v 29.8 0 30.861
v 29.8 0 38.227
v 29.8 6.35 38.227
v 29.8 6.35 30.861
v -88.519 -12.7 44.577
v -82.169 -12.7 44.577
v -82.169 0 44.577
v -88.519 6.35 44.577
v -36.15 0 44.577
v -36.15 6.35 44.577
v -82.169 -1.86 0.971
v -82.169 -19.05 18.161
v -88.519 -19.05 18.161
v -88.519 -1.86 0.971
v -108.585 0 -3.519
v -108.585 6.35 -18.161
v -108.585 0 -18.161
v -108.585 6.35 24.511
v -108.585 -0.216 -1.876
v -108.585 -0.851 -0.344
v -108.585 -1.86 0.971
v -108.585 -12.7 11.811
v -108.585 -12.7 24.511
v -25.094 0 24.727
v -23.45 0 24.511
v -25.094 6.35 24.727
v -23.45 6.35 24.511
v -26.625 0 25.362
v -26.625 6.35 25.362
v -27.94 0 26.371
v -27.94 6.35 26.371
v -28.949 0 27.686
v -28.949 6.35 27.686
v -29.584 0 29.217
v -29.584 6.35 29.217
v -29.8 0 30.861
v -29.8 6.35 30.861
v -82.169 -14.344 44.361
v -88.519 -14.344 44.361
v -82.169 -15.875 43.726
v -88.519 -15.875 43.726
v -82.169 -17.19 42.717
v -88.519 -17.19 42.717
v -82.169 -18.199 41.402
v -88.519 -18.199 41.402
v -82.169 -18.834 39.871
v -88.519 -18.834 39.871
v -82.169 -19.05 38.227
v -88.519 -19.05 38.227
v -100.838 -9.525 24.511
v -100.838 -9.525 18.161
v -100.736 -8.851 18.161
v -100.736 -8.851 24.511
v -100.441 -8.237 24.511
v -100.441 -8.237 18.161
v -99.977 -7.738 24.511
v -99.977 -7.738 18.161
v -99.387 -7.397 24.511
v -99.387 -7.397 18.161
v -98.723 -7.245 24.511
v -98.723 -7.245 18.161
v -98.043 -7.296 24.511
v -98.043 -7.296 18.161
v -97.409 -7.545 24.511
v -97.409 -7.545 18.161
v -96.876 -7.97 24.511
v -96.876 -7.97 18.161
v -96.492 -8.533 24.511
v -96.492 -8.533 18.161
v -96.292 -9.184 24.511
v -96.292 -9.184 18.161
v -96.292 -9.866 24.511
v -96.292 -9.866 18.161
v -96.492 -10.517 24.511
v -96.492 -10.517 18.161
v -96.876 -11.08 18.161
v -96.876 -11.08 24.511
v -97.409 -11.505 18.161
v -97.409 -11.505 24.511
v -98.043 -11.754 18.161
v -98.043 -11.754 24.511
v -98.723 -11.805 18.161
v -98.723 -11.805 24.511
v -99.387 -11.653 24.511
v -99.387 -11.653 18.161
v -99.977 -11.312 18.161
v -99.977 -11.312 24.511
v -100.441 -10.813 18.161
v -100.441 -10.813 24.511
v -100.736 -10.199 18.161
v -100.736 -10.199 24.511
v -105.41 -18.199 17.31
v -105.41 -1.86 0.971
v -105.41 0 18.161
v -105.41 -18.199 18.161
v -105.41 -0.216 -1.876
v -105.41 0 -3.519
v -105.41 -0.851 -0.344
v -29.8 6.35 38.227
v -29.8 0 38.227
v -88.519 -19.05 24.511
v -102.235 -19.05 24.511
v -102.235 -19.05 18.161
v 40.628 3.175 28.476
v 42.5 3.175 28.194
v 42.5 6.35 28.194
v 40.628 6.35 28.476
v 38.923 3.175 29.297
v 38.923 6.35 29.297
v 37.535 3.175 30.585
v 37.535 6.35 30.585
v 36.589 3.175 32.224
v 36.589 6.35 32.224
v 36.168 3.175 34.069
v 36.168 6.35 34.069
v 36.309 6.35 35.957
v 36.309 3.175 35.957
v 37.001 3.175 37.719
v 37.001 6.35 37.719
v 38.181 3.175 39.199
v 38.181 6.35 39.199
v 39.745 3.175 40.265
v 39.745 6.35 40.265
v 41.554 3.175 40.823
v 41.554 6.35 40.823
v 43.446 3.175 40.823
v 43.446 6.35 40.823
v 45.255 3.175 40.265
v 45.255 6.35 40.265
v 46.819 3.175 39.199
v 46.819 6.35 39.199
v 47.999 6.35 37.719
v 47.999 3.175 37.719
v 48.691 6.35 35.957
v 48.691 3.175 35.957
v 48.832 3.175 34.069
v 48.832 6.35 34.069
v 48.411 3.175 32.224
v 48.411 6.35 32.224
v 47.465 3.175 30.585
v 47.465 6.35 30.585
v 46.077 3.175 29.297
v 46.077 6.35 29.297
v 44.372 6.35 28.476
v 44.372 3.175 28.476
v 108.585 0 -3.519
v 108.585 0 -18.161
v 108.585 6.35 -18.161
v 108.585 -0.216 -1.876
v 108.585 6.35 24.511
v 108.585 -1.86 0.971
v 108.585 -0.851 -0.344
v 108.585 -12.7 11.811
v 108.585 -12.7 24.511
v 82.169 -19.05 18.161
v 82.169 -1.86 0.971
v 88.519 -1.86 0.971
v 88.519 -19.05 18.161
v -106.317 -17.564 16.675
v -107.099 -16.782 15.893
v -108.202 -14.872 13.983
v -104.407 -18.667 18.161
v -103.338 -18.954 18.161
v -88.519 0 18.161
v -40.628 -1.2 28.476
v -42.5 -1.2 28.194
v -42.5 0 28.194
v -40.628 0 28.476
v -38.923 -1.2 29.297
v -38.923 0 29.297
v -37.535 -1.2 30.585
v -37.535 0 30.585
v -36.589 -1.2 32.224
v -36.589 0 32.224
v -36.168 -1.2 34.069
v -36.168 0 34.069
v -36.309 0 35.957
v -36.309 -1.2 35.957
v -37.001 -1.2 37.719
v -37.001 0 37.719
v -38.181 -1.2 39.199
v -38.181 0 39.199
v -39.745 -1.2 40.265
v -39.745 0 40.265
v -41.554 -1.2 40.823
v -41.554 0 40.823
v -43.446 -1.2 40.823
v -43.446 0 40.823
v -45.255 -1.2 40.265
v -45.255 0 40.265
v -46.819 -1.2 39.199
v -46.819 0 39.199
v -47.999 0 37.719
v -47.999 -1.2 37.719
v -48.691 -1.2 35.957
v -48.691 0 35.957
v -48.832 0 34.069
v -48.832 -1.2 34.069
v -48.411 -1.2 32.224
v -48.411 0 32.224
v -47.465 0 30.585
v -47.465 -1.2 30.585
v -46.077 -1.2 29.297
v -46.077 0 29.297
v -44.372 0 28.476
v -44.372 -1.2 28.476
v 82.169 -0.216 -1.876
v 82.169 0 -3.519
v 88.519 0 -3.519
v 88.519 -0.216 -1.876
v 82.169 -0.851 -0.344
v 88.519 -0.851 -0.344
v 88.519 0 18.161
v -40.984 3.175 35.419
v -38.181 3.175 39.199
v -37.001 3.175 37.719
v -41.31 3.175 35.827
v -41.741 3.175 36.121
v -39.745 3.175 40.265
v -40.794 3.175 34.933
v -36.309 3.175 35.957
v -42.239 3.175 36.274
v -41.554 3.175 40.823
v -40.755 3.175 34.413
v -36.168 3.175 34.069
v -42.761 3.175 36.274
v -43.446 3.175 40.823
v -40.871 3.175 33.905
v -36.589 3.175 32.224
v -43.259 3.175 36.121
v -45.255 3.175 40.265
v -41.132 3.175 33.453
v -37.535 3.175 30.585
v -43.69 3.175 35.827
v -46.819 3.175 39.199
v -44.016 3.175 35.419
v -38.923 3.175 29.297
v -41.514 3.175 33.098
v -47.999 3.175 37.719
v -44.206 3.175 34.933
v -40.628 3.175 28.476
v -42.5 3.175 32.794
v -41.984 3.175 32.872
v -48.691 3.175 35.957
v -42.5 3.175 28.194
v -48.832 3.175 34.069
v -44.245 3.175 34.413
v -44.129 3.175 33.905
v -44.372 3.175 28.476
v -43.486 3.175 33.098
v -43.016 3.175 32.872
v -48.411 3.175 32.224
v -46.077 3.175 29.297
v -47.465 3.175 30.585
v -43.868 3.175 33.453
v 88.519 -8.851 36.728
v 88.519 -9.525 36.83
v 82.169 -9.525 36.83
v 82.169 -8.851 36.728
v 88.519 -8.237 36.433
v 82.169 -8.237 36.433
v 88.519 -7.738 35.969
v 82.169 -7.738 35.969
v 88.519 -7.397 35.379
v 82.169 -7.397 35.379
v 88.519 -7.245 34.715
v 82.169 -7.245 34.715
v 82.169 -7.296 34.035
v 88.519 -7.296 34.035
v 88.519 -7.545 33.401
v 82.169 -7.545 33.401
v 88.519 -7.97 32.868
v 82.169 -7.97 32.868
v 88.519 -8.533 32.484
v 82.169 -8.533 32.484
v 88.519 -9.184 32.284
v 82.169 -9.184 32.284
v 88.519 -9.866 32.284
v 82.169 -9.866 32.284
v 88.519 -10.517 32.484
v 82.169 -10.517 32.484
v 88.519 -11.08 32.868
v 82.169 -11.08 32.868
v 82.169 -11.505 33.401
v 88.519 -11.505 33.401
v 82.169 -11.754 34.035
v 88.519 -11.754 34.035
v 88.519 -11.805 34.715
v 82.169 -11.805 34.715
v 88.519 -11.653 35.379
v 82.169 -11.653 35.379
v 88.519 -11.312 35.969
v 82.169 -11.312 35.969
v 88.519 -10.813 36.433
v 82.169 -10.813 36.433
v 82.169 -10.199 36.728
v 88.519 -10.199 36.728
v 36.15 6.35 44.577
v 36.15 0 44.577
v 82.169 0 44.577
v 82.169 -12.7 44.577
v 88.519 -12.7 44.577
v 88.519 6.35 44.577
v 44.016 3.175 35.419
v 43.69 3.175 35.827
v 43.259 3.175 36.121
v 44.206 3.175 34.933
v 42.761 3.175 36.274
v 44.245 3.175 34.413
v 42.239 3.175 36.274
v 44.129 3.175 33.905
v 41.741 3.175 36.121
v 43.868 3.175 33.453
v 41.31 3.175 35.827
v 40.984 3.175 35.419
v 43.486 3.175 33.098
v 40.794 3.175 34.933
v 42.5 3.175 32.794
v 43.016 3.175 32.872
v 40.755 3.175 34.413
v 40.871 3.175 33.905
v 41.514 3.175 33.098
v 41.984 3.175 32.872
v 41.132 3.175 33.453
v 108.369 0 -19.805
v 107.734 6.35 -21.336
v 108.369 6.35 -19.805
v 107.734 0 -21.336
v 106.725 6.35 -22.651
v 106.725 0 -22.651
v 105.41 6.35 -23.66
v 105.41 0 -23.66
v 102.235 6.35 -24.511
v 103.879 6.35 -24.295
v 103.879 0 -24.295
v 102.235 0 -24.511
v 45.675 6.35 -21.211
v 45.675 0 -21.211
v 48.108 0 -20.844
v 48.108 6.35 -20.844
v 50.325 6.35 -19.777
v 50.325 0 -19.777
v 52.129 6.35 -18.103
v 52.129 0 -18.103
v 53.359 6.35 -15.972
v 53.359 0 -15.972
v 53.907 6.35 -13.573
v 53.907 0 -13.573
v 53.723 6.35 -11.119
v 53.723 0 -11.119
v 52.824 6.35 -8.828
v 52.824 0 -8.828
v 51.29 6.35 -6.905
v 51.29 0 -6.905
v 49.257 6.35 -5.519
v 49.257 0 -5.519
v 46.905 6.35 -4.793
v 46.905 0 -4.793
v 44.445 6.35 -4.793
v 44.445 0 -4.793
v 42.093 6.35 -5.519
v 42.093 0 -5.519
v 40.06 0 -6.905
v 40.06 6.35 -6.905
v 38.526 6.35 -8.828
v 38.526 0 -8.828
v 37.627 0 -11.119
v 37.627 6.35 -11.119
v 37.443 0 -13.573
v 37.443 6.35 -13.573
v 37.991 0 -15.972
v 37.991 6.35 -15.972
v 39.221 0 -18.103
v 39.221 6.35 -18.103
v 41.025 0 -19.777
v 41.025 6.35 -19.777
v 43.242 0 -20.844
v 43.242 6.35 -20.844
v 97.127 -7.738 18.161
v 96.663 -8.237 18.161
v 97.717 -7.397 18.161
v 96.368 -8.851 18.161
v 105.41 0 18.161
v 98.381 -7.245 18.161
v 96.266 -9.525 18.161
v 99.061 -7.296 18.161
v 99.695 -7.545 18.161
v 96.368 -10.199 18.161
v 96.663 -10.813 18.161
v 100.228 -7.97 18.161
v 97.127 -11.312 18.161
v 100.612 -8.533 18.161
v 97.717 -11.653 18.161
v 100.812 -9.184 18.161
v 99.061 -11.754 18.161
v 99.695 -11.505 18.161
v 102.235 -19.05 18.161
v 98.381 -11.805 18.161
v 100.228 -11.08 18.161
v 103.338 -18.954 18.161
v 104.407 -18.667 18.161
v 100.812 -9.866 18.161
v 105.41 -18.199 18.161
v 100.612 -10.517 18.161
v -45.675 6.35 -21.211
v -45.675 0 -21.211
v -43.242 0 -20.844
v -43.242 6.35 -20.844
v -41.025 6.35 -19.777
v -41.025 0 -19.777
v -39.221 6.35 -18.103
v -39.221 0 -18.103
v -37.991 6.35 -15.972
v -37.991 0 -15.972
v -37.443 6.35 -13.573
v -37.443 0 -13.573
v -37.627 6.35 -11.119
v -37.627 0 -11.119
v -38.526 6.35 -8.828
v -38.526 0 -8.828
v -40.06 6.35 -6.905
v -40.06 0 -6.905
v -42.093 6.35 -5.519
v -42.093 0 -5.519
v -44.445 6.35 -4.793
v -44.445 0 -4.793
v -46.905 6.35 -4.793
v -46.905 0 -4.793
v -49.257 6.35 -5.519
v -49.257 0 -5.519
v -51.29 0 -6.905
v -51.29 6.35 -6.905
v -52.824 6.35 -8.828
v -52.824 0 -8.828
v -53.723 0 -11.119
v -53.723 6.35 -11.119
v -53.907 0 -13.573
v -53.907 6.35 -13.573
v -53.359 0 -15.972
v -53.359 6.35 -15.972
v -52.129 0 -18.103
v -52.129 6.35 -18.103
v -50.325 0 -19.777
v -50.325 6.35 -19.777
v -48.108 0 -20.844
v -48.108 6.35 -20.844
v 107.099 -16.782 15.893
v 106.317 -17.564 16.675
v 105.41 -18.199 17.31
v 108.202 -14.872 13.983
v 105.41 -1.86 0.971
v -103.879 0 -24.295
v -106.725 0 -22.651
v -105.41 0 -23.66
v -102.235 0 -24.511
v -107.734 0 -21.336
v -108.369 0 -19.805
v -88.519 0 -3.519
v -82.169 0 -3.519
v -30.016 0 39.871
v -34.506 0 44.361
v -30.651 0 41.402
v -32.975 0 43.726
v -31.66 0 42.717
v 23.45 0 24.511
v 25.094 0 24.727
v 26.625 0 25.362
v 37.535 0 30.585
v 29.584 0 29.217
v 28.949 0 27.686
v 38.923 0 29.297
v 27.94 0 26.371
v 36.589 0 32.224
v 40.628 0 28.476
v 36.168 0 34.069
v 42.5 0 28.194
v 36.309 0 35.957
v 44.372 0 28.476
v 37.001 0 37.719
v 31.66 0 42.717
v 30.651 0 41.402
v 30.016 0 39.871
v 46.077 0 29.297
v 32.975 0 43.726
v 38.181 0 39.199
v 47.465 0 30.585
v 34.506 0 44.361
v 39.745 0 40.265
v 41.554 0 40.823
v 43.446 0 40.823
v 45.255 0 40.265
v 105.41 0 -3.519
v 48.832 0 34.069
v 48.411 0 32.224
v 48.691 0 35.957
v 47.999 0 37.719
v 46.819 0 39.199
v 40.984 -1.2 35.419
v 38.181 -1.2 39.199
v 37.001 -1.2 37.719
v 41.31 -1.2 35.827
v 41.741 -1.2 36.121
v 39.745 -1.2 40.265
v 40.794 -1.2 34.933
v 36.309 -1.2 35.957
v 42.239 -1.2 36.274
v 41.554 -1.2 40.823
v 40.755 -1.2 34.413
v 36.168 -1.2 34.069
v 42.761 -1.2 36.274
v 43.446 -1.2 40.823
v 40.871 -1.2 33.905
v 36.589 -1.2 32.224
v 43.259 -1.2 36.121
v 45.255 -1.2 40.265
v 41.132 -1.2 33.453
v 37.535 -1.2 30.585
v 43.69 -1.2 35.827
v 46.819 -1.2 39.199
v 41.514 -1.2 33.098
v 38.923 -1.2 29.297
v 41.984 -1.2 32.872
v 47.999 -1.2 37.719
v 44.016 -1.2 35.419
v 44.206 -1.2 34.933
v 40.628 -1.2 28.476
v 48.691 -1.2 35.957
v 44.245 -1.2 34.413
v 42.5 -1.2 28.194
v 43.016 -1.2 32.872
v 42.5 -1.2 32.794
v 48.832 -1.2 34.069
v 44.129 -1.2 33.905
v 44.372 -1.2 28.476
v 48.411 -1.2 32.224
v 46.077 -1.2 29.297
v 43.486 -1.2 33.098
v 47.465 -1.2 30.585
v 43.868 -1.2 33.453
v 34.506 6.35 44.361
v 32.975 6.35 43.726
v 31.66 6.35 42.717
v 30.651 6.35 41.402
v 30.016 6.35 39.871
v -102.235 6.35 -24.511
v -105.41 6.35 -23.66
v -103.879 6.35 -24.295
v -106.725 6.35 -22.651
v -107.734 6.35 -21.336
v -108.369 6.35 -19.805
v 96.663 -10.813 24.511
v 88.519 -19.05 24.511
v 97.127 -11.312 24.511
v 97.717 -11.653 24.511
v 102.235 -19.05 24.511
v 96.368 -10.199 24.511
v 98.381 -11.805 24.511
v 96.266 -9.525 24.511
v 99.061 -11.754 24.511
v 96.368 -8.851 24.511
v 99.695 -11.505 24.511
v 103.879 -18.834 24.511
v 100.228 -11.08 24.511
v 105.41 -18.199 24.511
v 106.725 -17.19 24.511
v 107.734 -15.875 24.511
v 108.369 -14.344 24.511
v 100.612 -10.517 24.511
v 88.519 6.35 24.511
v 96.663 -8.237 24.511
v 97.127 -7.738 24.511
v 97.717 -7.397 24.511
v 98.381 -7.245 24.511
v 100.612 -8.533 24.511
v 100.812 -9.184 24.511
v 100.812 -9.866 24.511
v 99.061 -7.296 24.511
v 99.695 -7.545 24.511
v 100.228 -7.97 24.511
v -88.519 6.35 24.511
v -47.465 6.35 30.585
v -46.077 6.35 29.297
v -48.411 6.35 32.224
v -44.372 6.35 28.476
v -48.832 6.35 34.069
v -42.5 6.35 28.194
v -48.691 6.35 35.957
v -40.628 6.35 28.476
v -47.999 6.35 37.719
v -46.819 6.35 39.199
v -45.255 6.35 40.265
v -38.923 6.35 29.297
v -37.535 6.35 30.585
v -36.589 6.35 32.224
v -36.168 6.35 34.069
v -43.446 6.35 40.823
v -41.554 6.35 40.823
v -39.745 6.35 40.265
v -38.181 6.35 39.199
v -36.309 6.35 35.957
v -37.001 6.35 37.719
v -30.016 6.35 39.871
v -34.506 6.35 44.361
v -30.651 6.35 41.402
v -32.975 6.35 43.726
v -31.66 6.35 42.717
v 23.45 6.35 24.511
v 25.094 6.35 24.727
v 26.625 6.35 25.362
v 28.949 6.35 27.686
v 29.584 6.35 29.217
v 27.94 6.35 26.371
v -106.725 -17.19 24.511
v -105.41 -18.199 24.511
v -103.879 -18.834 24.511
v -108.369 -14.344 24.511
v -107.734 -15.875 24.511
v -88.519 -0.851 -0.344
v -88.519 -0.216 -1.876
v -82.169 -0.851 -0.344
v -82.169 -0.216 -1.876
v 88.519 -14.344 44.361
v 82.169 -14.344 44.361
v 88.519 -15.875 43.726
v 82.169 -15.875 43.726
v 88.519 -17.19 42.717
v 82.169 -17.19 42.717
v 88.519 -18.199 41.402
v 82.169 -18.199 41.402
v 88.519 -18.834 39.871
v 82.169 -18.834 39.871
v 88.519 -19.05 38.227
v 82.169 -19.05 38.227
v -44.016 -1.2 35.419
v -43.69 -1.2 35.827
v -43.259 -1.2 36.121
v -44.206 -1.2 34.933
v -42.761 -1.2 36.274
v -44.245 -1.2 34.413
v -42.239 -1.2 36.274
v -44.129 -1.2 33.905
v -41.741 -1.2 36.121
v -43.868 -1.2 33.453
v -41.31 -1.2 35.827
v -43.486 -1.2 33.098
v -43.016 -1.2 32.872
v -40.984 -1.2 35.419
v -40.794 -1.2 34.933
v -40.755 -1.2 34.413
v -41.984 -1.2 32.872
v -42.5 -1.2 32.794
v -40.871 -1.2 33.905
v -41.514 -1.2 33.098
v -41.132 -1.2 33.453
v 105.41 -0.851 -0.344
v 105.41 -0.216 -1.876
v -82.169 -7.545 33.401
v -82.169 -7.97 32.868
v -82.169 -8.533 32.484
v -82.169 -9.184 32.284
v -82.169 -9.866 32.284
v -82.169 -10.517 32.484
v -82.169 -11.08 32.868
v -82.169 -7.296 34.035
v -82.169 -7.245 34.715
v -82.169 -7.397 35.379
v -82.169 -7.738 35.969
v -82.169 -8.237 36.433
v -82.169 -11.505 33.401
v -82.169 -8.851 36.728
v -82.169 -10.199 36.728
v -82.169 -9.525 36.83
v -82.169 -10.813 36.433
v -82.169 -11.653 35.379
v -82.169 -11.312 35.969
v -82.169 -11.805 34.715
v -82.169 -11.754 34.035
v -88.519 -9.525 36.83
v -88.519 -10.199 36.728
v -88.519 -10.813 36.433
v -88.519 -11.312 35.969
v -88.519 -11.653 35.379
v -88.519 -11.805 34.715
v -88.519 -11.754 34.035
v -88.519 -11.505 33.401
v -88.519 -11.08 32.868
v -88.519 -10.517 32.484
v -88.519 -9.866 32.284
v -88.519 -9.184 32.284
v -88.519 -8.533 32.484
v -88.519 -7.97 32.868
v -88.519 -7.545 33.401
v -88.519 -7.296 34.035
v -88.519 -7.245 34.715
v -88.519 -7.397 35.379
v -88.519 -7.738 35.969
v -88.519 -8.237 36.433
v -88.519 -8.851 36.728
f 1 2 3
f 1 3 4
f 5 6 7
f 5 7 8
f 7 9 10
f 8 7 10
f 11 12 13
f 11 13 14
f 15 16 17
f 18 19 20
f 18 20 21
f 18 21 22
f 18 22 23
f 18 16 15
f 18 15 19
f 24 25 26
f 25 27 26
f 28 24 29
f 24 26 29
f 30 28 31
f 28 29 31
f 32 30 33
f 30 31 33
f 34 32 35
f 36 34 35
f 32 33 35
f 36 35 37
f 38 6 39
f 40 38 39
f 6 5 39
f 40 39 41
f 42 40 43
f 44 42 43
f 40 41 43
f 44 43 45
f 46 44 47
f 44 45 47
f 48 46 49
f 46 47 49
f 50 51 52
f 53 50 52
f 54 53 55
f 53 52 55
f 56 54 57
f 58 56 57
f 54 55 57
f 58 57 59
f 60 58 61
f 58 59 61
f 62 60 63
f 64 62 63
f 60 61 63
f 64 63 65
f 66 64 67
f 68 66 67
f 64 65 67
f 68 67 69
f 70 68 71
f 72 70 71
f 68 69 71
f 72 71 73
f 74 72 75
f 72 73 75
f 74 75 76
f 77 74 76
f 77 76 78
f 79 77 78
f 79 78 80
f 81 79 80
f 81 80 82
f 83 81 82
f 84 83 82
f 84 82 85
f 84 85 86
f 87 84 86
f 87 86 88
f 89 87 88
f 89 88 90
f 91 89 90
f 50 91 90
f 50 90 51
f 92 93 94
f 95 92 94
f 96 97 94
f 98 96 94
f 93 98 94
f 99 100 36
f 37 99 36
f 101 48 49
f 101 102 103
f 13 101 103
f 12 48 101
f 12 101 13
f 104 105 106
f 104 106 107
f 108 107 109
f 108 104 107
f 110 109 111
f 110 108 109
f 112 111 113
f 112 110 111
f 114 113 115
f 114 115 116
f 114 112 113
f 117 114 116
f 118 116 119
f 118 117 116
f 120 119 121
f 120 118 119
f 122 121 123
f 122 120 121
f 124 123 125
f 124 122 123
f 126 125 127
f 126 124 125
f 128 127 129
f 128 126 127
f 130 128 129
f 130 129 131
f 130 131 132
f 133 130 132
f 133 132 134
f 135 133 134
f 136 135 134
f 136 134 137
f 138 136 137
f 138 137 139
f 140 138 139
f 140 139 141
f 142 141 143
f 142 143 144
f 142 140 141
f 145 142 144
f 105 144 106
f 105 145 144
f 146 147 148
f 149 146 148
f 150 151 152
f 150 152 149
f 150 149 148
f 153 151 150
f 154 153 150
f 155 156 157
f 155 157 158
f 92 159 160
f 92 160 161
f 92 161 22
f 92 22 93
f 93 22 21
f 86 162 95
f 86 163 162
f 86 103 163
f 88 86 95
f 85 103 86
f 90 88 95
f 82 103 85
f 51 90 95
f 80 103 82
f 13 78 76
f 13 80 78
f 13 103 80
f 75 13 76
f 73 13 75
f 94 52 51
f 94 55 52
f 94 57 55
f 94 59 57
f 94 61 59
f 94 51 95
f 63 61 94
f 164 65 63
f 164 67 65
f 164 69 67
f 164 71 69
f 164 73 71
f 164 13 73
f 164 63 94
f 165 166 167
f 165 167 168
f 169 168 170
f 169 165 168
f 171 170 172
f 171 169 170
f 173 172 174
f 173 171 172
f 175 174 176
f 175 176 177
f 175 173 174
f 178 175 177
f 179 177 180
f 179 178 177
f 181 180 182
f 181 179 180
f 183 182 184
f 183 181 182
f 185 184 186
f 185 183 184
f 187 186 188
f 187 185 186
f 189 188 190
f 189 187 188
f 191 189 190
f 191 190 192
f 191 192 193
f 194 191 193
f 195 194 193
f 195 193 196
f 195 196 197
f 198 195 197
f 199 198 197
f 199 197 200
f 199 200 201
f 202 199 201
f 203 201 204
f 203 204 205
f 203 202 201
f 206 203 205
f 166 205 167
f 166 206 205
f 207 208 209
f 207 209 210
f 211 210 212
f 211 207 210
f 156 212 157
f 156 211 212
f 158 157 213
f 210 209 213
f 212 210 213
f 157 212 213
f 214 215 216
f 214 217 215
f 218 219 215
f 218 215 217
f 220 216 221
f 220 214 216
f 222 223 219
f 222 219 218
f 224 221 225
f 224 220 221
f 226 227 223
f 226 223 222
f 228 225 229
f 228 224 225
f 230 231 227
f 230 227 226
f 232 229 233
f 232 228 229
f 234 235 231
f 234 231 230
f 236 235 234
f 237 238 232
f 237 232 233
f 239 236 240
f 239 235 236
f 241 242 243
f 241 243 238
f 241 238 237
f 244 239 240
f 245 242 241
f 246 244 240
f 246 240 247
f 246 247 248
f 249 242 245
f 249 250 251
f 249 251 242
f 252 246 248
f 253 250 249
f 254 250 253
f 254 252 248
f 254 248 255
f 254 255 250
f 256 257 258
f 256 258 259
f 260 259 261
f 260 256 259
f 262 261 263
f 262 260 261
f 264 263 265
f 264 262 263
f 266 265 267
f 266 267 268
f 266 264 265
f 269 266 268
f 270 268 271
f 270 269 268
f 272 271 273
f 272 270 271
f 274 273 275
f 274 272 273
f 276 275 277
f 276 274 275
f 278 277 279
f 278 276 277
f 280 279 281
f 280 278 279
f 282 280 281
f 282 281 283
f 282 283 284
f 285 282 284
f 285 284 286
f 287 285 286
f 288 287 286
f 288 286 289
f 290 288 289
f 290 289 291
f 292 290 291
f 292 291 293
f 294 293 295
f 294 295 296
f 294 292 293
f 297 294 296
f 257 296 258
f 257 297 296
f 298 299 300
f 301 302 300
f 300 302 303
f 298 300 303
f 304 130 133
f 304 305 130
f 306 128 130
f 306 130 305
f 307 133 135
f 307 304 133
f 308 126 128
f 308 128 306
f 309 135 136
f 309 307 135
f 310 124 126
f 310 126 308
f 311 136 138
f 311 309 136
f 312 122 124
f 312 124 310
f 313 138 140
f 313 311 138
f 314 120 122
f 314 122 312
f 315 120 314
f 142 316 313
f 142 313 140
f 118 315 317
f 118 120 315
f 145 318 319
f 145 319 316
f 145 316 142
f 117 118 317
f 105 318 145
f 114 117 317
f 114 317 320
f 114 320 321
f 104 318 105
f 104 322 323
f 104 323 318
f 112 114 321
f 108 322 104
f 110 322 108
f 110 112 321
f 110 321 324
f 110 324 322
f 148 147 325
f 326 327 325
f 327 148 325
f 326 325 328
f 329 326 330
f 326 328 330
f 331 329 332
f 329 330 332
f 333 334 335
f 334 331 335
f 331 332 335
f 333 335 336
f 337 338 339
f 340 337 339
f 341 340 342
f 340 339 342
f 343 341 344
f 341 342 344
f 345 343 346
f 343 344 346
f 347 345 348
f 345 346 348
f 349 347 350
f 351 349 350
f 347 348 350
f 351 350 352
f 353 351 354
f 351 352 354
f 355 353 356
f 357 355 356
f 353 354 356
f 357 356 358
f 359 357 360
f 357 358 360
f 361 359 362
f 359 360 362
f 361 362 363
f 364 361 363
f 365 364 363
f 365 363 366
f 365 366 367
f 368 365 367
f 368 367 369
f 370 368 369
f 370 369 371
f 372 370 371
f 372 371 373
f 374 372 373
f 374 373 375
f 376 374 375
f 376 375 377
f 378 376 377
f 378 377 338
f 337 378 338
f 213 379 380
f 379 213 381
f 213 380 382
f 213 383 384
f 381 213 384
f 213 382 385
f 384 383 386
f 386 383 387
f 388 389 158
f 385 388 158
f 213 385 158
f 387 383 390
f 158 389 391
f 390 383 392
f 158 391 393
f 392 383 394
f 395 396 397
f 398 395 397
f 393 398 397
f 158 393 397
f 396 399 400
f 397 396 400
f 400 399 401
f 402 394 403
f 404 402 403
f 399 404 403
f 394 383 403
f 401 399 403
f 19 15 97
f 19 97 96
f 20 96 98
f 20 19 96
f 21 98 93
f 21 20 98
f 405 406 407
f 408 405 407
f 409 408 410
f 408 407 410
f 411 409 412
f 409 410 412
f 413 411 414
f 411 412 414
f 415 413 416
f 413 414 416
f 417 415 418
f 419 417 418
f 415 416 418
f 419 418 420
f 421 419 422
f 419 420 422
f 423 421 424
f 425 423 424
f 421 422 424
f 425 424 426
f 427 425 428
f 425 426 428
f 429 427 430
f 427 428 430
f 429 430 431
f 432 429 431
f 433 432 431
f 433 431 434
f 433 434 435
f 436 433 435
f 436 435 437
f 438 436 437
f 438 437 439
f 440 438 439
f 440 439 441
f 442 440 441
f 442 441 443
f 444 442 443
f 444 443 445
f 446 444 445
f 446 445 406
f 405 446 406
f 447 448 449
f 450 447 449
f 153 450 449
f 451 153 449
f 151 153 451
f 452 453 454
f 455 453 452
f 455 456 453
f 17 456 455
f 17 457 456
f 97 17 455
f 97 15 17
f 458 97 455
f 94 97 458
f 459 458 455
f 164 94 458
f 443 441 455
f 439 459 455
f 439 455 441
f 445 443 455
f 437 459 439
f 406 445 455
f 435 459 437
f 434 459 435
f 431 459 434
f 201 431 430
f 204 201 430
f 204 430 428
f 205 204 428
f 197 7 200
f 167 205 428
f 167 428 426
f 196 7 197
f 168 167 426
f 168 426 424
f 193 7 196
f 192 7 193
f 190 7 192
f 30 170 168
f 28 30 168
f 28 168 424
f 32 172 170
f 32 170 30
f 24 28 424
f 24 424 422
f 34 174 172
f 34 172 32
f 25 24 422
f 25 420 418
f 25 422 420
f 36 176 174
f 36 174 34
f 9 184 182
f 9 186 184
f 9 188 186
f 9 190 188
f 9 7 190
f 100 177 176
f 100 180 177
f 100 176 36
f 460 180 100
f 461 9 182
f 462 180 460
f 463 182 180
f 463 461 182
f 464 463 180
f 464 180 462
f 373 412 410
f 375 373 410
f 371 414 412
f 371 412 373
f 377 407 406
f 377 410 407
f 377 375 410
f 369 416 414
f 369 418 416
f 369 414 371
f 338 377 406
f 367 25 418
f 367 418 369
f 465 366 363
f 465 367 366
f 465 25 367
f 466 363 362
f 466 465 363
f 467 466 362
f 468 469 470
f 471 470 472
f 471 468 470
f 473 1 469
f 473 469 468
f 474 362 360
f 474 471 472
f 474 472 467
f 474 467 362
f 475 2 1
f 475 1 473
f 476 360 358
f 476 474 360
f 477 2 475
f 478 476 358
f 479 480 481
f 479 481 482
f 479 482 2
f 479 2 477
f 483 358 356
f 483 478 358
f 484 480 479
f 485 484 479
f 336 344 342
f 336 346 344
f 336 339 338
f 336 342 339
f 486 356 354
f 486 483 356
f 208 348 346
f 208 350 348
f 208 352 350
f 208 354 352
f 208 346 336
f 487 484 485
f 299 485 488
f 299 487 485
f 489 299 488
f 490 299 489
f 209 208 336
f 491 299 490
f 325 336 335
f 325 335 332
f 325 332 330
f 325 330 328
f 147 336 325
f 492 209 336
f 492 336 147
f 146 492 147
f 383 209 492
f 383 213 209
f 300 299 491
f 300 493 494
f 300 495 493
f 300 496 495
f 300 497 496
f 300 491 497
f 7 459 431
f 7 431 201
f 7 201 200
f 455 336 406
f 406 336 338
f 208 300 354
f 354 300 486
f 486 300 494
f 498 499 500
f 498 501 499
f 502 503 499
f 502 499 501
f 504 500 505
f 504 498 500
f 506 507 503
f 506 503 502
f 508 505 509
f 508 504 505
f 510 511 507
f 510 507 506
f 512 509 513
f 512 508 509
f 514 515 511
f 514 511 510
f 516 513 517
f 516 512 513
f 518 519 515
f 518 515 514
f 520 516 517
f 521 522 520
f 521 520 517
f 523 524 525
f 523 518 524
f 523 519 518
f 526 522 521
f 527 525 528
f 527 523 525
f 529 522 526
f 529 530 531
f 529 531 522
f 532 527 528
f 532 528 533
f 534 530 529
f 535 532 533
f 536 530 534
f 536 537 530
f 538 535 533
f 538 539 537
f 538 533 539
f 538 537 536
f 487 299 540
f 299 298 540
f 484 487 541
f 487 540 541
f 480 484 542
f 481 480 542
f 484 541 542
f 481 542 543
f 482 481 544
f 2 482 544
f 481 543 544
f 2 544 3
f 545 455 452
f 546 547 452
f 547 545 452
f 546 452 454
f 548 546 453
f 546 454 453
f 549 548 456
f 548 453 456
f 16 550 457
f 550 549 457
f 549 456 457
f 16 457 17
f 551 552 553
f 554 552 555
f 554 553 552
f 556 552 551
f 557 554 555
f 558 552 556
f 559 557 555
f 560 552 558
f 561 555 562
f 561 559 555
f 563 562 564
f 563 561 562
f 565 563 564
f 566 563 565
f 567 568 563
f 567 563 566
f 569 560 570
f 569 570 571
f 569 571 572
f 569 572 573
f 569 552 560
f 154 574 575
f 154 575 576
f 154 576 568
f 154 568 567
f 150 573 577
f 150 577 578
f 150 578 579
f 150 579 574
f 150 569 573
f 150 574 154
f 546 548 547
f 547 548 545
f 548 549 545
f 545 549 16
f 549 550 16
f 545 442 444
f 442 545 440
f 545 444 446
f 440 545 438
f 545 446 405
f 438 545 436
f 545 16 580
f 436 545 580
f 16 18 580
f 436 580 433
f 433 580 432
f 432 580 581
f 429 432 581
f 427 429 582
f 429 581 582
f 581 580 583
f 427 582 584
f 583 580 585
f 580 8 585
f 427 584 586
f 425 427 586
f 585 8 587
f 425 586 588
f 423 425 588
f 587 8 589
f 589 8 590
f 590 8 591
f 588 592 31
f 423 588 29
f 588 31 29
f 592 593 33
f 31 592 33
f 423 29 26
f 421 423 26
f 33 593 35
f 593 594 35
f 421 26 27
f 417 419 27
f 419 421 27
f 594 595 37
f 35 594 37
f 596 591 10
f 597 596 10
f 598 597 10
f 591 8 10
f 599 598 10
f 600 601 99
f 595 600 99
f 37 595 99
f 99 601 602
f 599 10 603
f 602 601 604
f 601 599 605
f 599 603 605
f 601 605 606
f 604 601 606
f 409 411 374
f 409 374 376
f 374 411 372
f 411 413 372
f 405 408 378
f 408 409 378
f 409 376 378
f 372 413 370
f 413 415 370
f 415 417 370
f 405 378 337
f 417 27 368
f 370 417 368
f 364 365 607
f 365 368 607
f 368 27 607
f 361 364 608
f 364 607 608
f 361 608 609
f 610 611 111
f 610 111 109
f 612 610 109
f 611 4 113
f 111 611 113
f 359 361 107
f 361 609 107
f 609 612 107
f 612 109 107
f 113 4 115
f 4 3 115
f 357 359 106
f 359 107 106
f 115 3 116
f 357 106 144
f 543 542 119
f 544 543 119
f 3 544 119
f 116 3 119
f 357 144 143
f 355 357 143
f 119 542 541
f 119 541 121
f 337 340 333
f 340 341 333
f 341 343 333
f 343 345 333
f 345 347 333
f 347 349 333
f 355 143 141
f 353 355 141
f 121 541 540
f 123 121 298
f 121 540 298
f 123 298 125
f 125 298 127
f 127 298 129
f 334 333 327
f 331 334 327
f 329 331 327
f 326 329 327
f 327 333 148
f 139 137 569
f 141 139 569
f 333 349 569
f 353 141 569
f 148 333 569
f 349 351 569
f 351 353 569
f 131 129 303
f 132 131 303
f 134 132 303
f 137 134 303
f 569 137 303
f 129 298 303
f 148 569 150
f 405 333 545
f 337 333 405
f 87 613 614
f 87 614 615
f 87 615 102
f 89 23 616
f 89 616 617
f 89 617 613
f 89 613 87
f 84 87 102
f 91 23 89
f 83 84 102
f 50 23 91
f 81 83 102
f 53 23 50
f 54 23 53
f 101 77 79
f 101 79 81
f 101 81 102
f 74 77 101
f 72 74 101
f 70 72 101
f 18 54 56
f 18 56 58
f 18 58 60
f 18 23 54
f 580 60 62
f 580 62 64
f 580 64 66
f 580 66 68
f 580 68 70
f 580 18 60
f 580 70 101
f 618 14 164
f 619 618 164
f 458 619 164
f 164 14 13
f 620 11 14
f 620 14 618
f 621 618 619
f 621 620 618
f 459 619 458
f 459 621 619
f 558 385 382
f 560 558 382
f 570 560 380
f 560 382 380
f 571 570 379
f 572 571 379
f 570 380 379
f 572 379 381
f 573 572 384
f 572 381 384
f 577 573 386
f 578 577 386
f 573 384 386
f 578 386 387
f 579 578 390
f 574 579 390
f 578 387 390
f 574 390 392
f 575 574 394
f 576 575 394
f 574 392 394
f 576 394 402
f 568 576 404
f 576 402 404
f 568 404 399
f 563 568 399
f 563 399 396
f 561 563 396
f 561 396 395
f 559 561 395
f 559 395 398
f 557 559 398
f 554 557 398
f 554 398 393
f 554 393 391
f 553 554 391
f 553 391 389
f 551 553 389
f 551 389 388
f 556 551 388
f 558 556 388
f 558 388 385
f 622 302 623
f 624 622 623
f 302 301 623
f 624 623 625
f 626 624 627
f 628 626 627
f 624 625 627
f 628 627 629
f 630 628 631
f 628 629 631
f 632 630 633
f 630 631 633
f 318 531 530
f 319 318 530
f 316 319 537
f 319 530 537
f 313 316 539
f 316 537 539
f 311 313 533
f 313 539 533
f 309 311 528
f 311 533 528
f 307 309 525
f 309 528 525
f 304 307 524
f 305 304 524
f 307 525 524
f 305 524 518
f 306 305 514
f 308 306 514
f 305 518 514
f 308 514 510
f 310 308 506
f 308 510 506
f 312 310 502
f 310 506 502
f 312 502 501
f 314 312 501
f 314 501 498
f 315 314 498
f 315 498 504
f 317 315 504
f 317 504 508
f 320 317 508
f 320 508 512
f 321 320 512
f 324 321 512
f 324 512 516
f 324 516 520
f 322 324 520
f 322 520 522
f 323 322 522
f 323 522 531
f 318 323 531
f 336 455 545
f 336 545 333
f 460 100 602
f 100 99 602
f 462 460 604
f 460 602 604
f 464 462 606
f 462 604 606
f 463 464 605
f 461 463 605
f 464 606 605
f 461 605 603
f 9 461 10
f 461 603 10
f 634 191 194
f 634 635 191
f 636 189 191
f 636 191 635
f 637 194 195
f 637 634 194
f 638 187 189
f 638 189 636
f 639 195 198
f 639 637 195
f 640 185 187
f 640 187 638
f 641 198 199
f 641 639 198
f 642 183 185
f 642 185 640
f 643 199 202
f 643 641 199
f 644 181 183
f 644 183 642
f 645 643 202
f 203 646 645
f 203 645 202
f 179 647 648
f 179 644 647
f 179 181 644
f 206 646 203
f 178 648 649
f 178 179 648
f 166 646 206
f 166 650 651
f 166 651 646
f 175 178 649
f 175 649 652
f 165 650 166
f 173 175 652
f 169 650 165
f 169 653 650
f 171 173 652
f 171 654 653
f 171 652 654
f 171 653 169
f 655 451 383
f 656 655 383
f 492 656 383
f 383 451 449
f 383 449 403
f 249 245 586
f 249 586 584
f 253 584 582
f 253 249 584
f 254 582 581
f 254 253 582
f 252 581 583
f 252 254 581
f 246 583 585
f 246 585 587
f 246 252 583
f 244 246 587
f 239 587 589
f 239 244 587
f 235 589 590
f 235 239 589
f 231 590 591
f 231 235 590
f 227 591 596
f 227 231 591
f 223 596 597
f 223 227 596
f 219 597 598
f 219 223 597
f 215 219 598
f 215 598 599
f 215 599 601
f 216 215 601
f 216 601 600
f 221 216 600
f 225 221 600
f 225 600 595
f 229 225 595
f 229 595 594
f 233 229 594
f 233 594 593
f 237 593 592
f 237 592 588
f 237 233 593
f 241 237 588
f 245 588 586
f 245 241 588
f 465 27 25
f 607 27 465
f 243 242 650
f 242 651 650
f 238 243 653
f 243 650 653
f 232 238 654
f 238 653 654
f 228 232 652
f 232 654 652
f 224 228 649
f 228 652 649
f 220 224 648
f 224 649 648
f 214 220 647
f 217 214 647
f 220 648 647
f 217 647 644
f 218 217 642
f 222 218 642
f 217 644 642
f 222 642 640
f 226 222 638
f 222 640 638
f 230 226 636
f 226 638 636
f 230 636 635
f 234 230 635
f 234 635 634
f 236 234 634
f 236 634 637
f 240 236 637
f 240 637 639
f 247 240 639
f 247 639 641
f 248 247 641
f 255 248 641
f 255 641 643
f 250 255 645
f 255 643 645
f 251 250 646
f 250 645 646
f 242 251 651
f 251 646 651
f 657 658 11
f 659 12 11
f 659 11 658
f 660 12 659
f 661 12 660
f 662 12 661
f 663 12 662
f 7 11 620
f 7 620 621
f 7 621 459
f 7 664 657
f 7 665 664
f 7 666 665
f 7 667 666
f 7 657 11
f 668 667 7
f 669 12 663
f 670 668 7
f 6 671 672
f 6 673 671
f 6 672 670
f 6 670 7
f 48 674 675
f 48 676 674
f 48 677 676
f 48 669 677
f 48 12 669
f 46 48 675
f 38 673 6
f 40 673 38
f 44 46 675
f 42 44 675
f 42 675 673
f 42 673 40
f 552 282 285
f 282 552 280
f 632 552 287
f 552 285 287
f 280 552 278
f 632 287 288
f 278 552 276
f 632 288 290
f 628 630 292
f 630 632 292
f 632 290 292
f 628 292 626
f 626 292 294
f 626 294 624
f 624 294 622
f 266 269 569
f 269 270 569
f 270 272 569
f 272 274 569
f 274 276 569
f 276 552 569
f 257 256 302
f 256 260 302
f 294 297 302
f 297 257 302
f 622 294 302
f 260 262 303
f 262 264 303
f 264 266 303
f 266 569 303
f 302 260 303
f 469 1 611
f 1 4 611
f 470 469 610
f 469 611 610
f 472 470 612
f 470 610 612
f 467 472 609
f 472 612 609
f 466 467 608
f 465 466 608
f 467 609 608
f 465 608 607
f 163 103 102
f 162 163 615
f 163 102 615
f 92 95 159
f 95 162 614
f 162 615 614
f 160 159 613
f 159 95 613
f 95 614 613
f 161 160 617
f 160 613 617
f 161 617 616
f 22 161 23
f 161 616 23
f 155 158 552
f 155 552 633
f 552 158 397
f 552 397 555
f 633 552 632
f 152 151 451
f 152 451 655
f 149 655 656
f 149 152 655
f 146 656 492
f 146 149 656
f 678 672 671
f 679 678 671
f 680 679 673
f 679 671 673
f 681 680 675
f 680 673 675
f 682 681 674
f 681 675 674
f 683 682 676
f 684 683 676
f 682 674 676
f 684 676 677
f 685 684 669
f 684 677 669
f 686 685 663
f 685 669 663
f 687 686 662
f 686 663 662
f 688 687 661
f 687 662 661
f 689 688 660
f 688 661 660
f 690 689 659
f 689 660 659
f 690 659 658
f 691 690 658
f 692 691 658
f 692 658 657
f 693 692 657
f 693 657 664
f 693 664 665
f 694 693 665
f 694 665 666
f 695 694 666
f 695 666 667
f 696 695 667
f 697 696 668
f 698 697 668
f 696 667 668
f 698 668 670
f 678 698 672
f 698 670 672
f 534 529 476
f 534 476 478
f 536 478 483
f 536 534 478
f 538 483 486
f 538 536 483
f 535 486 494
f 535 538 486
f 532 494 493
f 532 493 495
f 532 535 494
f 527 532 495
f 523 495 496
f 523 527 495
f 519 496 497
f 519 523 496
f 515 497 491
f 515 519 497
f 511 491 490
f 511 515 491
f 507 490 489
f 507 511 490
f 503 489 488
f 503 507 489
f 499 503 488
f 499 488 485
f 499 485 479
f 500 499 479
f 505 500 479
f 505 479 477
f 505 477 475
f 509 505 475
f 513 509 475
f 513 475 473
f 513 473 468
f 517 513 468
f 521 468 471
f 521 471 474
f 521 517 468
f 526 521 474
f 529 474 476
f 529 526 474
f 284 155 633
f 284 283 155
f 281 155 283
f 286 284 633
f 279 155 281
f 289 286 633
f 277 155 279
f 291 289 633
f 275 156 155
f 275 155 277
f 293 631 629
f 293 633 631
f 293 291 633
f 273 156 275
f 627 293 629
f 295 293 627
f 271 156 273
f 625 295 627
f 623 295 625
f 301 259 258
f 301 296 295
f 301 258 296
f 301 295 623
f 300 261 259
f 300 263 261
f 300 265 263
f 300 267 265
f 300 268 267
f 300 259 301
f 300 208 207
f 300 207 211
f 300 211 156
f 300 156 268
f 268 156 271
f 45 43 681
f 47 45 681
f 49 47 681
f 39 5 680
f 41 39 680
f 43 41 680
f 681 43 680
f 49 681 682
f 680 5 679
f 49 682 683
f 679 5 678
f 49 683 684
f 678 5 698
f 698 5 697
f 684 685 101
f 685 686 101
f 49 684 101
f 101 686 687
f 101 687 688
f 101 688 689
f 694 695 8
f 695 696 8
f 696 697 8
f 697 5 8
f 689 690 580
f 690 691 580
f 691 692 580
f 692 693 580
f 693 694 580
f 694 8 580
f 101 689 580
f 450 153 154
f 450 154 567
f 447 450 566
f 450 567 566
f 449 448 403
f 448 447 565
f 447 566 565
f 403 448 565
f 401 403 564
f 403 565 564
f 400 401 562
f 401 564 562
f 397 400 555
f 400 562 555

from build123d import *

# Parameters (mm, degrees)
SKETCH1_W            = 217.17
SKETCH1_H            = 49.022
BOSS_EXTRUDE1_DEPTH  = 6.35
SKETCH5_W            = 20.066
SKETCH5_H            = 25.4
BOSS_EXTRUDE3_DEPTH  = 6.35
SKETCH6_W            = 25.4
SKETCH6_H            = 20.066
BOSS_EXTRUDE4_DEPTH  = 6.35
SKETCH7_R            = 1.75
CUT_EXTRUDE1_DEPTH   = 119.914732704
SKETCH9_R            = 2.286
CUT_EXTRUDE2_DEPTH   = 119.213807607
BOSS_EXTRUDE8_DEPTH  = 3.175
BOSS_EXTRUDE9_START  = 1.2
SKETCH15_R           = 6.35
SKETCH15_R_2         = 1.75
BOSS_EXTRUDE9_DEPTH  = 1.2
CUT_EXTRUDE4_START   = -3.175
SKETCH16_R           = 6.35
CUT_EXTRUDE4_DEPTH   = 3.175
SKETCH17_R           = 8.255
CUT_EXTRUDE5_DEPTH   = 119.914732704
SKETCH18_W           = 33.319
SKETCH18_H           = 20.066
BOSS_EXTRUDE10_DEPTH = 6.35
SKETCH19_R           = 2.286
BOSS_EXTRUDE11_DEPTH = 6.35
BOSS_EXTRUDE12_START = 6.35
SKETCH20_W           = 26.416
SKETCH20_H           = 19.05
SKETCH20_R           = 2.286
BOSS_EXTRUDE12_DEPTH = 6.35
BOSS_EXTRUDE13_DEPTH = 3.175
BOSS_EXTRUDE14_DEPTH = 3.175
BOSS_EXTRUDE15_DEPTH = 6.35
BOSS_EXTRUDE16_DEPTH = 6.35
FILLET2_R            = 6.35
FILLET3_R            = 6.35


with BuildPart() as part:
    # Sketch1 → Boss-Extrude1 (new body)
    with BuildSketch(Plane(origin=(0, 0, 0), x_dir=(1, 0, 0), z_dir=(0, 1, 0))):
        Rectangle(SKETCH1_W, SKETCH1_H)
    extrude(amount=BOSS_EXTRUDE1_DEPTH)

    # Sketch5 → Boss-Extrude3 (add)
    with BuildSketch(Plane.XY.offset(24.511)):
        with Locations((-98.552, -6.35)):
            Rectangle(SKETCH5_W, SKETCH5_H)
        with Locations((98.552, -6.35)):
            Rectangle(SKETCH5_W, SKETCH5_H)
    extrude(amount=-BOSS_EXTRUDE3_DEPTH)

    # Sketch6 → Boss-Extrude4 (add)
    with BuildSketch(Plane(origin=(0, 0, 0), x_dir=(-1, 0, 0), z_dir=(0, -1, 0))):
        with Locations((42.5, -34.544)):
            Rectangle(SKETCH6_W, SKETCH6_H)
        with Locations((-42.5, -34.544)):
            Rectangle(SKETCH6_W, SKETCH6_H)
    extrude(amount=-BOSS_EXTRUDE4_DEPTH)

    # Sketch7 → Cut-Extrude1 (cut, through all)
    with BuildSketch(Plane.XZ):
        with Locations(Location((-42.5, 34.544, 0), (0, 0, 270))):
            Circle(SKETCH7_R)
        with Locations(Location((42.5, 34.544, 0), (0, 0, 270))):
            Circle(SKETCH7_R)
    extrude(amount=-CUT_EXTRUDE1_DEPTH, mode=Mode.SUBTRACT)

    # Sketch9 → Cut-Extrude2 (cut, through all)
    with BuildSketch(Plane(origin=(0, 0, 18.161), x_dir=(-1, 0, 0), z_dir=(0, 0, -1))):
        with Locations((98.552, -9.525)):
            Circle(SKETCH9_R)
        with Locations((-98.552, -9.525)):
            Circle(SKETCH9_R)
    extrude(amount=-CUT_EXTRUDE2_DEPTH, mode=Mode.SUBTRACT)

    # Sketch14 → Boss-Extrude8 (add)
    with BuildSketch(Plane.ZY.offset(108.585)):
        Polygon((-24.511, 6.35), (-24.511, 0), (18.161, 0), (18.161, -19.05), (24.511, -19.05), (24.511, 6.35), align=None)
    extrude(amount=-BOSS_EXTRUDE8_DEPTH)

    # Sketch15 → Boss-Extrude9 (add)
    # profile 1 of 2: a face of its own
    with BuildSketch(Plane.XZ.offset(BOSS_EXTRUDE9_START)):
        with Locations(Location((42.5, 34.544, 0), (0, 0, 270))):
            Circle(SKETCH15_R)
        with Locations(Location((42.5, 34.544, 0), (0, 0, 270))):
            Circle(SKETCH15_R_2, mode=Mode.SUBTRACT)
    # profile 2 of 2: a face of its own
    with BuildSketch(Plane.XZ.offset(BOSS_EXTRUDE9_START)):
        with Locations(Location((-42.5, 34.544, 0), (0, 0, 270))):
            Circle(SKETCH15_R)
        with Locations(Location((-42.5, 34.544, 0), (0, 0, 270))):
            Circle(SKETCH15_R_2, mode=Mode.SUBTRACT)
    extrude(amount=-BOSS_EXTRUDE9_DEPTH)

    # Sketch16 → Cut-Extrude4 (cut)
    with BuildSketch(Plane(origin=(0, 6.35, 0), x_dir=(1, 0, 0), z_dir=(0, 1, 0)).offset(CUT_EXTRUDE4_START)):
        with Locations(Location((42.5, -34.544, 0), (0, 0, 90))):
            Circle(SKETCH16_R)
        with Locations(Location((-42.5, -34.544, 0), (0, 0, 90))):
            Circle(SKETCH16_R)
    extrude(amount=CUT_EXTRUDE4_DEPTH, mode=Mode.SUBTRACT)

    # Sketch17 → Cut-Extrude5 (cut, through all)
    with BuildSketch(Plane.XZ):
        with Locations(Location((-45.675, -12.956, 0), (0, 0, 270))):
            Circle(SKETCH17_R)
        with Locations(Location((45.675, -12.956, 0), (0, 0, 270))):
            Circle(SKETCH17_R)
    extrude(amount=-CUT_EXTRUDE5_DEPTH, mode=Mode.SUBTRACT)

    # Sketch18 → Boss-Extrude10 (add)
    with BuildSketch(Plane.XZ):
        with Locations((71.8595, 34.544)):
            Rectangle(SKETCH18_W, SKETCH18_H)
        with Locations((-71.8595, 34.544)):
            Rectangle(SKETCH18_W, SKETCH18_H)
    extrude(amount=-BOSS_EXTRUDE10_DEPTH)

    # Sketch19 → Boss-Extrude11 (add)
    with BuildSketch(Plane.ZY.offset(-88.519)):
        Polygon((24.511, -19.05), (44.577, -19.05), (44.577, 0), (24.511, 0), (18.161, 0), (18.161, -19.05), align=None)
        with Locations((34.544, -9.525)):
            Circle(SKETCH19_R, mode=Mode.SUBTRACT)
    extrude(amount=BOSS_EXTRUDE11_DEPTH)

    # Sketch20 → Boss-Extrude12 (add)
    with BuildSketch(Plane(origin=(-88.519, 0, 0), x_dir=(0, 0, -1), z_dir=(1, 0, 0)).offset(BOSS_EXTRUDE12_START)):
        with Locations((-31.369, -9.525)):
            Rectangle(SKETCH20_W, SKETCH20_H)
        with Locations(Location((-34.544, -9.525, 0), (0, 0, 180))):
            Circle(SKETCH20_R, mode=Mode.SUBTRACT)
    extrude(amount=-BOSS_EXTRUDE12_DEPTH)

    # Sketch21 → Boss-Extrude13 (add)
    with BuildSketch(Plane.ZY.offset(108.585)):
        Polygon((18.161, -19.05), (-0.889, 0), (18.161, 0), align=None)
    extrude(amount=-BOSS_EXTRUDE13_DEPTH)

    # Sketch22 → Boss-Extrude14 (add)
    with BuildSketch(Plane(origin=(108.585, 0, 0), x_dir=(0, 0, -1), z_dir=(1, 0, 0))):
        Polygon((-18.161, 0), (-18.161, -19.05), (0.889, 0), align=None)
    extrude(amount=-BOSS_EXTRUDE14_DEPTH)

    # Sketch23 → Boss-Extrude15 (add)
    with BuildSketch(Plane(origin=(-82.169, 0, 0), x_dir=(0, 0, -1), z_dir=(1, 0, 0))):
        Polygon((-18.161, 0), (-18.161, -19.05), (0.889, 0), align=None)
    extrude(amount=-BOSS_EXTRUDE15_DEPTH)

    # Sketch24 → Boss-Extrude16 (add)
    with BuildSketch(Plane.ZY.offset(-82.169)):
        Polygon((18.161, 0), (-0.889, 0), (18.161, -19.05), align=None)
    extrude(amount=-BOSS_EXTRUDE16_DEPTH)

    # Fillet2
    fillet2_edges = [part.edges().sort_by_distance(p)[0] for p in [
        (85.344, -19.05, 44.577),
        (-85.344, -19.05, 44.577),
        (-29.8, 3.175, 44.577),
        (-29.8, 3.175, 24.511),
        (29.8, 3.175, 24.511),
        (29.8, 3.175, 44.577),
    ]]
    fillet(fillet2_edges, radius=FILLET2_R)

    # Fillet3
    # the kernel refuses this fillet: 6.35 mm, written as the material it adds along each edge
    with BuildSketch(Plane(origin=(-108.585, 0, -0.889), x_dir=(0, 0, -1), z_dir=(1, 0, 0))) as fillet3_piece_1:
        with BuildLine():
            CenterArc((FILLET3_R * 0.414213562373, -FILLET3_R), FILLET3_R, 90, 45)
            Line((-FILLET3_R * 0.292893218813, -FILLET3_R * 0.292893218813), (0, 0))
            Line((0, 0), (FILLET3_R * 0.414213562373, 0))
        make_face()
    extrude(amount=3.175)
    with BuildSketch(Plane(origin=(108.585, 0, -0.889), x_dir=(0, 0, -1), z_dir=(-1, 0, 0))) as fillet3_piece_2:
        with BuildLine():
            CenterArc((FILLET3_R * 0.414213562373, FILLET3_R), FILLET3_R, 225, 45)
            Line((-FILLET3_R * 0.292893218813, FILLET3_R * 0.292893218813), (0, 0))
            Line((0, 0), (FILLET3_R * 0.414213562373, 0))
        make_face()
    extrude(amount=3.175)
    with BuildSketch(Plane(origin=(-82.169, 0, -0.889), x_dir=(0, 0, -1), z_dir=(-1, 0, 0))) as fillet3_piece_3:
        with BuildLine():
            CenterArc((FILLET3_R * 0.414213562373, FILLET3_R), FILLET3_R, 225, 45)
            Line((-FILLET3_R * 0.292893218813, FILLET3_R * 0.292893218813), (0, 0))
            Line((0, 0), (FILLET3_R * 0.414213562373, 0))
        make_face()
    extrude(amount=6.35)
    with BuildSketch(Plane(origin=(82.169, 0, -0.889), x_dir=(0, 0, -1), z_dir=(1, 0, 0))) as fillet3_piece_4:
        with BuildLine():
            CenterArc((FILLET3_R * 0.414213562373, -FILLET3_R), FILLET3_R, 90, 45)
            Line((-FILLET3_R * 0.292893218813, -FILLET3_R * 0.292893218813), (0, 0))
            Line((0, 0), (FILLET3_R * 0.414213562373, 0))
        make_face()
    extrude(amount=6.35)
    # the kernel refuses this fillet: 6.35 mm, written as the material it takes off along each edge
    with BuildSketch(Plane(origin=(-108.585, -19.05, 40.386), x_dir=(1, 0, 0), z_dir=(0, 0, -1))) as fillet3_2_piece_1:
        with BuildLine():
            CenterArc((FILLET3_R, -FILLET3_R), FILLET3_R, 90, 90)
            Line((0, -FILLET3_R), (0, 0))
            Line((0, 0), (FILLET3_R, 0))
        make_face()
    extrude(amount=38.1, mode=Mode.SUBTRACT)
    with BuildSketch(Plane(origin=(108.585, -19.05, 40.386), x_dir=(-1, 0, 0), z_dir=(0, 0, -1)), Plane(origin=(-108.585, -15.875, -24.511), x_dir=(0, 0, 1), z_dir=(0, 1, 0)), Plane(origin=(108.585, -15.875, -24.511), x_dir=(-1, 0, 0), z_dir=(0, 1, 0))) as fillet3_2_piece_2:
        with BuildLine():
            CenterArc((FILLET3_R, FILLET3_R), FILLET3_R, 180, 90)
            Line((0, FILLET3_R), (0, 0))
            Line((0, 0), (FILLET3_R, 0))
        make_face()
    extrude(amount=38.1, mode=Mode.SUBTRACT)


solid = part.part
